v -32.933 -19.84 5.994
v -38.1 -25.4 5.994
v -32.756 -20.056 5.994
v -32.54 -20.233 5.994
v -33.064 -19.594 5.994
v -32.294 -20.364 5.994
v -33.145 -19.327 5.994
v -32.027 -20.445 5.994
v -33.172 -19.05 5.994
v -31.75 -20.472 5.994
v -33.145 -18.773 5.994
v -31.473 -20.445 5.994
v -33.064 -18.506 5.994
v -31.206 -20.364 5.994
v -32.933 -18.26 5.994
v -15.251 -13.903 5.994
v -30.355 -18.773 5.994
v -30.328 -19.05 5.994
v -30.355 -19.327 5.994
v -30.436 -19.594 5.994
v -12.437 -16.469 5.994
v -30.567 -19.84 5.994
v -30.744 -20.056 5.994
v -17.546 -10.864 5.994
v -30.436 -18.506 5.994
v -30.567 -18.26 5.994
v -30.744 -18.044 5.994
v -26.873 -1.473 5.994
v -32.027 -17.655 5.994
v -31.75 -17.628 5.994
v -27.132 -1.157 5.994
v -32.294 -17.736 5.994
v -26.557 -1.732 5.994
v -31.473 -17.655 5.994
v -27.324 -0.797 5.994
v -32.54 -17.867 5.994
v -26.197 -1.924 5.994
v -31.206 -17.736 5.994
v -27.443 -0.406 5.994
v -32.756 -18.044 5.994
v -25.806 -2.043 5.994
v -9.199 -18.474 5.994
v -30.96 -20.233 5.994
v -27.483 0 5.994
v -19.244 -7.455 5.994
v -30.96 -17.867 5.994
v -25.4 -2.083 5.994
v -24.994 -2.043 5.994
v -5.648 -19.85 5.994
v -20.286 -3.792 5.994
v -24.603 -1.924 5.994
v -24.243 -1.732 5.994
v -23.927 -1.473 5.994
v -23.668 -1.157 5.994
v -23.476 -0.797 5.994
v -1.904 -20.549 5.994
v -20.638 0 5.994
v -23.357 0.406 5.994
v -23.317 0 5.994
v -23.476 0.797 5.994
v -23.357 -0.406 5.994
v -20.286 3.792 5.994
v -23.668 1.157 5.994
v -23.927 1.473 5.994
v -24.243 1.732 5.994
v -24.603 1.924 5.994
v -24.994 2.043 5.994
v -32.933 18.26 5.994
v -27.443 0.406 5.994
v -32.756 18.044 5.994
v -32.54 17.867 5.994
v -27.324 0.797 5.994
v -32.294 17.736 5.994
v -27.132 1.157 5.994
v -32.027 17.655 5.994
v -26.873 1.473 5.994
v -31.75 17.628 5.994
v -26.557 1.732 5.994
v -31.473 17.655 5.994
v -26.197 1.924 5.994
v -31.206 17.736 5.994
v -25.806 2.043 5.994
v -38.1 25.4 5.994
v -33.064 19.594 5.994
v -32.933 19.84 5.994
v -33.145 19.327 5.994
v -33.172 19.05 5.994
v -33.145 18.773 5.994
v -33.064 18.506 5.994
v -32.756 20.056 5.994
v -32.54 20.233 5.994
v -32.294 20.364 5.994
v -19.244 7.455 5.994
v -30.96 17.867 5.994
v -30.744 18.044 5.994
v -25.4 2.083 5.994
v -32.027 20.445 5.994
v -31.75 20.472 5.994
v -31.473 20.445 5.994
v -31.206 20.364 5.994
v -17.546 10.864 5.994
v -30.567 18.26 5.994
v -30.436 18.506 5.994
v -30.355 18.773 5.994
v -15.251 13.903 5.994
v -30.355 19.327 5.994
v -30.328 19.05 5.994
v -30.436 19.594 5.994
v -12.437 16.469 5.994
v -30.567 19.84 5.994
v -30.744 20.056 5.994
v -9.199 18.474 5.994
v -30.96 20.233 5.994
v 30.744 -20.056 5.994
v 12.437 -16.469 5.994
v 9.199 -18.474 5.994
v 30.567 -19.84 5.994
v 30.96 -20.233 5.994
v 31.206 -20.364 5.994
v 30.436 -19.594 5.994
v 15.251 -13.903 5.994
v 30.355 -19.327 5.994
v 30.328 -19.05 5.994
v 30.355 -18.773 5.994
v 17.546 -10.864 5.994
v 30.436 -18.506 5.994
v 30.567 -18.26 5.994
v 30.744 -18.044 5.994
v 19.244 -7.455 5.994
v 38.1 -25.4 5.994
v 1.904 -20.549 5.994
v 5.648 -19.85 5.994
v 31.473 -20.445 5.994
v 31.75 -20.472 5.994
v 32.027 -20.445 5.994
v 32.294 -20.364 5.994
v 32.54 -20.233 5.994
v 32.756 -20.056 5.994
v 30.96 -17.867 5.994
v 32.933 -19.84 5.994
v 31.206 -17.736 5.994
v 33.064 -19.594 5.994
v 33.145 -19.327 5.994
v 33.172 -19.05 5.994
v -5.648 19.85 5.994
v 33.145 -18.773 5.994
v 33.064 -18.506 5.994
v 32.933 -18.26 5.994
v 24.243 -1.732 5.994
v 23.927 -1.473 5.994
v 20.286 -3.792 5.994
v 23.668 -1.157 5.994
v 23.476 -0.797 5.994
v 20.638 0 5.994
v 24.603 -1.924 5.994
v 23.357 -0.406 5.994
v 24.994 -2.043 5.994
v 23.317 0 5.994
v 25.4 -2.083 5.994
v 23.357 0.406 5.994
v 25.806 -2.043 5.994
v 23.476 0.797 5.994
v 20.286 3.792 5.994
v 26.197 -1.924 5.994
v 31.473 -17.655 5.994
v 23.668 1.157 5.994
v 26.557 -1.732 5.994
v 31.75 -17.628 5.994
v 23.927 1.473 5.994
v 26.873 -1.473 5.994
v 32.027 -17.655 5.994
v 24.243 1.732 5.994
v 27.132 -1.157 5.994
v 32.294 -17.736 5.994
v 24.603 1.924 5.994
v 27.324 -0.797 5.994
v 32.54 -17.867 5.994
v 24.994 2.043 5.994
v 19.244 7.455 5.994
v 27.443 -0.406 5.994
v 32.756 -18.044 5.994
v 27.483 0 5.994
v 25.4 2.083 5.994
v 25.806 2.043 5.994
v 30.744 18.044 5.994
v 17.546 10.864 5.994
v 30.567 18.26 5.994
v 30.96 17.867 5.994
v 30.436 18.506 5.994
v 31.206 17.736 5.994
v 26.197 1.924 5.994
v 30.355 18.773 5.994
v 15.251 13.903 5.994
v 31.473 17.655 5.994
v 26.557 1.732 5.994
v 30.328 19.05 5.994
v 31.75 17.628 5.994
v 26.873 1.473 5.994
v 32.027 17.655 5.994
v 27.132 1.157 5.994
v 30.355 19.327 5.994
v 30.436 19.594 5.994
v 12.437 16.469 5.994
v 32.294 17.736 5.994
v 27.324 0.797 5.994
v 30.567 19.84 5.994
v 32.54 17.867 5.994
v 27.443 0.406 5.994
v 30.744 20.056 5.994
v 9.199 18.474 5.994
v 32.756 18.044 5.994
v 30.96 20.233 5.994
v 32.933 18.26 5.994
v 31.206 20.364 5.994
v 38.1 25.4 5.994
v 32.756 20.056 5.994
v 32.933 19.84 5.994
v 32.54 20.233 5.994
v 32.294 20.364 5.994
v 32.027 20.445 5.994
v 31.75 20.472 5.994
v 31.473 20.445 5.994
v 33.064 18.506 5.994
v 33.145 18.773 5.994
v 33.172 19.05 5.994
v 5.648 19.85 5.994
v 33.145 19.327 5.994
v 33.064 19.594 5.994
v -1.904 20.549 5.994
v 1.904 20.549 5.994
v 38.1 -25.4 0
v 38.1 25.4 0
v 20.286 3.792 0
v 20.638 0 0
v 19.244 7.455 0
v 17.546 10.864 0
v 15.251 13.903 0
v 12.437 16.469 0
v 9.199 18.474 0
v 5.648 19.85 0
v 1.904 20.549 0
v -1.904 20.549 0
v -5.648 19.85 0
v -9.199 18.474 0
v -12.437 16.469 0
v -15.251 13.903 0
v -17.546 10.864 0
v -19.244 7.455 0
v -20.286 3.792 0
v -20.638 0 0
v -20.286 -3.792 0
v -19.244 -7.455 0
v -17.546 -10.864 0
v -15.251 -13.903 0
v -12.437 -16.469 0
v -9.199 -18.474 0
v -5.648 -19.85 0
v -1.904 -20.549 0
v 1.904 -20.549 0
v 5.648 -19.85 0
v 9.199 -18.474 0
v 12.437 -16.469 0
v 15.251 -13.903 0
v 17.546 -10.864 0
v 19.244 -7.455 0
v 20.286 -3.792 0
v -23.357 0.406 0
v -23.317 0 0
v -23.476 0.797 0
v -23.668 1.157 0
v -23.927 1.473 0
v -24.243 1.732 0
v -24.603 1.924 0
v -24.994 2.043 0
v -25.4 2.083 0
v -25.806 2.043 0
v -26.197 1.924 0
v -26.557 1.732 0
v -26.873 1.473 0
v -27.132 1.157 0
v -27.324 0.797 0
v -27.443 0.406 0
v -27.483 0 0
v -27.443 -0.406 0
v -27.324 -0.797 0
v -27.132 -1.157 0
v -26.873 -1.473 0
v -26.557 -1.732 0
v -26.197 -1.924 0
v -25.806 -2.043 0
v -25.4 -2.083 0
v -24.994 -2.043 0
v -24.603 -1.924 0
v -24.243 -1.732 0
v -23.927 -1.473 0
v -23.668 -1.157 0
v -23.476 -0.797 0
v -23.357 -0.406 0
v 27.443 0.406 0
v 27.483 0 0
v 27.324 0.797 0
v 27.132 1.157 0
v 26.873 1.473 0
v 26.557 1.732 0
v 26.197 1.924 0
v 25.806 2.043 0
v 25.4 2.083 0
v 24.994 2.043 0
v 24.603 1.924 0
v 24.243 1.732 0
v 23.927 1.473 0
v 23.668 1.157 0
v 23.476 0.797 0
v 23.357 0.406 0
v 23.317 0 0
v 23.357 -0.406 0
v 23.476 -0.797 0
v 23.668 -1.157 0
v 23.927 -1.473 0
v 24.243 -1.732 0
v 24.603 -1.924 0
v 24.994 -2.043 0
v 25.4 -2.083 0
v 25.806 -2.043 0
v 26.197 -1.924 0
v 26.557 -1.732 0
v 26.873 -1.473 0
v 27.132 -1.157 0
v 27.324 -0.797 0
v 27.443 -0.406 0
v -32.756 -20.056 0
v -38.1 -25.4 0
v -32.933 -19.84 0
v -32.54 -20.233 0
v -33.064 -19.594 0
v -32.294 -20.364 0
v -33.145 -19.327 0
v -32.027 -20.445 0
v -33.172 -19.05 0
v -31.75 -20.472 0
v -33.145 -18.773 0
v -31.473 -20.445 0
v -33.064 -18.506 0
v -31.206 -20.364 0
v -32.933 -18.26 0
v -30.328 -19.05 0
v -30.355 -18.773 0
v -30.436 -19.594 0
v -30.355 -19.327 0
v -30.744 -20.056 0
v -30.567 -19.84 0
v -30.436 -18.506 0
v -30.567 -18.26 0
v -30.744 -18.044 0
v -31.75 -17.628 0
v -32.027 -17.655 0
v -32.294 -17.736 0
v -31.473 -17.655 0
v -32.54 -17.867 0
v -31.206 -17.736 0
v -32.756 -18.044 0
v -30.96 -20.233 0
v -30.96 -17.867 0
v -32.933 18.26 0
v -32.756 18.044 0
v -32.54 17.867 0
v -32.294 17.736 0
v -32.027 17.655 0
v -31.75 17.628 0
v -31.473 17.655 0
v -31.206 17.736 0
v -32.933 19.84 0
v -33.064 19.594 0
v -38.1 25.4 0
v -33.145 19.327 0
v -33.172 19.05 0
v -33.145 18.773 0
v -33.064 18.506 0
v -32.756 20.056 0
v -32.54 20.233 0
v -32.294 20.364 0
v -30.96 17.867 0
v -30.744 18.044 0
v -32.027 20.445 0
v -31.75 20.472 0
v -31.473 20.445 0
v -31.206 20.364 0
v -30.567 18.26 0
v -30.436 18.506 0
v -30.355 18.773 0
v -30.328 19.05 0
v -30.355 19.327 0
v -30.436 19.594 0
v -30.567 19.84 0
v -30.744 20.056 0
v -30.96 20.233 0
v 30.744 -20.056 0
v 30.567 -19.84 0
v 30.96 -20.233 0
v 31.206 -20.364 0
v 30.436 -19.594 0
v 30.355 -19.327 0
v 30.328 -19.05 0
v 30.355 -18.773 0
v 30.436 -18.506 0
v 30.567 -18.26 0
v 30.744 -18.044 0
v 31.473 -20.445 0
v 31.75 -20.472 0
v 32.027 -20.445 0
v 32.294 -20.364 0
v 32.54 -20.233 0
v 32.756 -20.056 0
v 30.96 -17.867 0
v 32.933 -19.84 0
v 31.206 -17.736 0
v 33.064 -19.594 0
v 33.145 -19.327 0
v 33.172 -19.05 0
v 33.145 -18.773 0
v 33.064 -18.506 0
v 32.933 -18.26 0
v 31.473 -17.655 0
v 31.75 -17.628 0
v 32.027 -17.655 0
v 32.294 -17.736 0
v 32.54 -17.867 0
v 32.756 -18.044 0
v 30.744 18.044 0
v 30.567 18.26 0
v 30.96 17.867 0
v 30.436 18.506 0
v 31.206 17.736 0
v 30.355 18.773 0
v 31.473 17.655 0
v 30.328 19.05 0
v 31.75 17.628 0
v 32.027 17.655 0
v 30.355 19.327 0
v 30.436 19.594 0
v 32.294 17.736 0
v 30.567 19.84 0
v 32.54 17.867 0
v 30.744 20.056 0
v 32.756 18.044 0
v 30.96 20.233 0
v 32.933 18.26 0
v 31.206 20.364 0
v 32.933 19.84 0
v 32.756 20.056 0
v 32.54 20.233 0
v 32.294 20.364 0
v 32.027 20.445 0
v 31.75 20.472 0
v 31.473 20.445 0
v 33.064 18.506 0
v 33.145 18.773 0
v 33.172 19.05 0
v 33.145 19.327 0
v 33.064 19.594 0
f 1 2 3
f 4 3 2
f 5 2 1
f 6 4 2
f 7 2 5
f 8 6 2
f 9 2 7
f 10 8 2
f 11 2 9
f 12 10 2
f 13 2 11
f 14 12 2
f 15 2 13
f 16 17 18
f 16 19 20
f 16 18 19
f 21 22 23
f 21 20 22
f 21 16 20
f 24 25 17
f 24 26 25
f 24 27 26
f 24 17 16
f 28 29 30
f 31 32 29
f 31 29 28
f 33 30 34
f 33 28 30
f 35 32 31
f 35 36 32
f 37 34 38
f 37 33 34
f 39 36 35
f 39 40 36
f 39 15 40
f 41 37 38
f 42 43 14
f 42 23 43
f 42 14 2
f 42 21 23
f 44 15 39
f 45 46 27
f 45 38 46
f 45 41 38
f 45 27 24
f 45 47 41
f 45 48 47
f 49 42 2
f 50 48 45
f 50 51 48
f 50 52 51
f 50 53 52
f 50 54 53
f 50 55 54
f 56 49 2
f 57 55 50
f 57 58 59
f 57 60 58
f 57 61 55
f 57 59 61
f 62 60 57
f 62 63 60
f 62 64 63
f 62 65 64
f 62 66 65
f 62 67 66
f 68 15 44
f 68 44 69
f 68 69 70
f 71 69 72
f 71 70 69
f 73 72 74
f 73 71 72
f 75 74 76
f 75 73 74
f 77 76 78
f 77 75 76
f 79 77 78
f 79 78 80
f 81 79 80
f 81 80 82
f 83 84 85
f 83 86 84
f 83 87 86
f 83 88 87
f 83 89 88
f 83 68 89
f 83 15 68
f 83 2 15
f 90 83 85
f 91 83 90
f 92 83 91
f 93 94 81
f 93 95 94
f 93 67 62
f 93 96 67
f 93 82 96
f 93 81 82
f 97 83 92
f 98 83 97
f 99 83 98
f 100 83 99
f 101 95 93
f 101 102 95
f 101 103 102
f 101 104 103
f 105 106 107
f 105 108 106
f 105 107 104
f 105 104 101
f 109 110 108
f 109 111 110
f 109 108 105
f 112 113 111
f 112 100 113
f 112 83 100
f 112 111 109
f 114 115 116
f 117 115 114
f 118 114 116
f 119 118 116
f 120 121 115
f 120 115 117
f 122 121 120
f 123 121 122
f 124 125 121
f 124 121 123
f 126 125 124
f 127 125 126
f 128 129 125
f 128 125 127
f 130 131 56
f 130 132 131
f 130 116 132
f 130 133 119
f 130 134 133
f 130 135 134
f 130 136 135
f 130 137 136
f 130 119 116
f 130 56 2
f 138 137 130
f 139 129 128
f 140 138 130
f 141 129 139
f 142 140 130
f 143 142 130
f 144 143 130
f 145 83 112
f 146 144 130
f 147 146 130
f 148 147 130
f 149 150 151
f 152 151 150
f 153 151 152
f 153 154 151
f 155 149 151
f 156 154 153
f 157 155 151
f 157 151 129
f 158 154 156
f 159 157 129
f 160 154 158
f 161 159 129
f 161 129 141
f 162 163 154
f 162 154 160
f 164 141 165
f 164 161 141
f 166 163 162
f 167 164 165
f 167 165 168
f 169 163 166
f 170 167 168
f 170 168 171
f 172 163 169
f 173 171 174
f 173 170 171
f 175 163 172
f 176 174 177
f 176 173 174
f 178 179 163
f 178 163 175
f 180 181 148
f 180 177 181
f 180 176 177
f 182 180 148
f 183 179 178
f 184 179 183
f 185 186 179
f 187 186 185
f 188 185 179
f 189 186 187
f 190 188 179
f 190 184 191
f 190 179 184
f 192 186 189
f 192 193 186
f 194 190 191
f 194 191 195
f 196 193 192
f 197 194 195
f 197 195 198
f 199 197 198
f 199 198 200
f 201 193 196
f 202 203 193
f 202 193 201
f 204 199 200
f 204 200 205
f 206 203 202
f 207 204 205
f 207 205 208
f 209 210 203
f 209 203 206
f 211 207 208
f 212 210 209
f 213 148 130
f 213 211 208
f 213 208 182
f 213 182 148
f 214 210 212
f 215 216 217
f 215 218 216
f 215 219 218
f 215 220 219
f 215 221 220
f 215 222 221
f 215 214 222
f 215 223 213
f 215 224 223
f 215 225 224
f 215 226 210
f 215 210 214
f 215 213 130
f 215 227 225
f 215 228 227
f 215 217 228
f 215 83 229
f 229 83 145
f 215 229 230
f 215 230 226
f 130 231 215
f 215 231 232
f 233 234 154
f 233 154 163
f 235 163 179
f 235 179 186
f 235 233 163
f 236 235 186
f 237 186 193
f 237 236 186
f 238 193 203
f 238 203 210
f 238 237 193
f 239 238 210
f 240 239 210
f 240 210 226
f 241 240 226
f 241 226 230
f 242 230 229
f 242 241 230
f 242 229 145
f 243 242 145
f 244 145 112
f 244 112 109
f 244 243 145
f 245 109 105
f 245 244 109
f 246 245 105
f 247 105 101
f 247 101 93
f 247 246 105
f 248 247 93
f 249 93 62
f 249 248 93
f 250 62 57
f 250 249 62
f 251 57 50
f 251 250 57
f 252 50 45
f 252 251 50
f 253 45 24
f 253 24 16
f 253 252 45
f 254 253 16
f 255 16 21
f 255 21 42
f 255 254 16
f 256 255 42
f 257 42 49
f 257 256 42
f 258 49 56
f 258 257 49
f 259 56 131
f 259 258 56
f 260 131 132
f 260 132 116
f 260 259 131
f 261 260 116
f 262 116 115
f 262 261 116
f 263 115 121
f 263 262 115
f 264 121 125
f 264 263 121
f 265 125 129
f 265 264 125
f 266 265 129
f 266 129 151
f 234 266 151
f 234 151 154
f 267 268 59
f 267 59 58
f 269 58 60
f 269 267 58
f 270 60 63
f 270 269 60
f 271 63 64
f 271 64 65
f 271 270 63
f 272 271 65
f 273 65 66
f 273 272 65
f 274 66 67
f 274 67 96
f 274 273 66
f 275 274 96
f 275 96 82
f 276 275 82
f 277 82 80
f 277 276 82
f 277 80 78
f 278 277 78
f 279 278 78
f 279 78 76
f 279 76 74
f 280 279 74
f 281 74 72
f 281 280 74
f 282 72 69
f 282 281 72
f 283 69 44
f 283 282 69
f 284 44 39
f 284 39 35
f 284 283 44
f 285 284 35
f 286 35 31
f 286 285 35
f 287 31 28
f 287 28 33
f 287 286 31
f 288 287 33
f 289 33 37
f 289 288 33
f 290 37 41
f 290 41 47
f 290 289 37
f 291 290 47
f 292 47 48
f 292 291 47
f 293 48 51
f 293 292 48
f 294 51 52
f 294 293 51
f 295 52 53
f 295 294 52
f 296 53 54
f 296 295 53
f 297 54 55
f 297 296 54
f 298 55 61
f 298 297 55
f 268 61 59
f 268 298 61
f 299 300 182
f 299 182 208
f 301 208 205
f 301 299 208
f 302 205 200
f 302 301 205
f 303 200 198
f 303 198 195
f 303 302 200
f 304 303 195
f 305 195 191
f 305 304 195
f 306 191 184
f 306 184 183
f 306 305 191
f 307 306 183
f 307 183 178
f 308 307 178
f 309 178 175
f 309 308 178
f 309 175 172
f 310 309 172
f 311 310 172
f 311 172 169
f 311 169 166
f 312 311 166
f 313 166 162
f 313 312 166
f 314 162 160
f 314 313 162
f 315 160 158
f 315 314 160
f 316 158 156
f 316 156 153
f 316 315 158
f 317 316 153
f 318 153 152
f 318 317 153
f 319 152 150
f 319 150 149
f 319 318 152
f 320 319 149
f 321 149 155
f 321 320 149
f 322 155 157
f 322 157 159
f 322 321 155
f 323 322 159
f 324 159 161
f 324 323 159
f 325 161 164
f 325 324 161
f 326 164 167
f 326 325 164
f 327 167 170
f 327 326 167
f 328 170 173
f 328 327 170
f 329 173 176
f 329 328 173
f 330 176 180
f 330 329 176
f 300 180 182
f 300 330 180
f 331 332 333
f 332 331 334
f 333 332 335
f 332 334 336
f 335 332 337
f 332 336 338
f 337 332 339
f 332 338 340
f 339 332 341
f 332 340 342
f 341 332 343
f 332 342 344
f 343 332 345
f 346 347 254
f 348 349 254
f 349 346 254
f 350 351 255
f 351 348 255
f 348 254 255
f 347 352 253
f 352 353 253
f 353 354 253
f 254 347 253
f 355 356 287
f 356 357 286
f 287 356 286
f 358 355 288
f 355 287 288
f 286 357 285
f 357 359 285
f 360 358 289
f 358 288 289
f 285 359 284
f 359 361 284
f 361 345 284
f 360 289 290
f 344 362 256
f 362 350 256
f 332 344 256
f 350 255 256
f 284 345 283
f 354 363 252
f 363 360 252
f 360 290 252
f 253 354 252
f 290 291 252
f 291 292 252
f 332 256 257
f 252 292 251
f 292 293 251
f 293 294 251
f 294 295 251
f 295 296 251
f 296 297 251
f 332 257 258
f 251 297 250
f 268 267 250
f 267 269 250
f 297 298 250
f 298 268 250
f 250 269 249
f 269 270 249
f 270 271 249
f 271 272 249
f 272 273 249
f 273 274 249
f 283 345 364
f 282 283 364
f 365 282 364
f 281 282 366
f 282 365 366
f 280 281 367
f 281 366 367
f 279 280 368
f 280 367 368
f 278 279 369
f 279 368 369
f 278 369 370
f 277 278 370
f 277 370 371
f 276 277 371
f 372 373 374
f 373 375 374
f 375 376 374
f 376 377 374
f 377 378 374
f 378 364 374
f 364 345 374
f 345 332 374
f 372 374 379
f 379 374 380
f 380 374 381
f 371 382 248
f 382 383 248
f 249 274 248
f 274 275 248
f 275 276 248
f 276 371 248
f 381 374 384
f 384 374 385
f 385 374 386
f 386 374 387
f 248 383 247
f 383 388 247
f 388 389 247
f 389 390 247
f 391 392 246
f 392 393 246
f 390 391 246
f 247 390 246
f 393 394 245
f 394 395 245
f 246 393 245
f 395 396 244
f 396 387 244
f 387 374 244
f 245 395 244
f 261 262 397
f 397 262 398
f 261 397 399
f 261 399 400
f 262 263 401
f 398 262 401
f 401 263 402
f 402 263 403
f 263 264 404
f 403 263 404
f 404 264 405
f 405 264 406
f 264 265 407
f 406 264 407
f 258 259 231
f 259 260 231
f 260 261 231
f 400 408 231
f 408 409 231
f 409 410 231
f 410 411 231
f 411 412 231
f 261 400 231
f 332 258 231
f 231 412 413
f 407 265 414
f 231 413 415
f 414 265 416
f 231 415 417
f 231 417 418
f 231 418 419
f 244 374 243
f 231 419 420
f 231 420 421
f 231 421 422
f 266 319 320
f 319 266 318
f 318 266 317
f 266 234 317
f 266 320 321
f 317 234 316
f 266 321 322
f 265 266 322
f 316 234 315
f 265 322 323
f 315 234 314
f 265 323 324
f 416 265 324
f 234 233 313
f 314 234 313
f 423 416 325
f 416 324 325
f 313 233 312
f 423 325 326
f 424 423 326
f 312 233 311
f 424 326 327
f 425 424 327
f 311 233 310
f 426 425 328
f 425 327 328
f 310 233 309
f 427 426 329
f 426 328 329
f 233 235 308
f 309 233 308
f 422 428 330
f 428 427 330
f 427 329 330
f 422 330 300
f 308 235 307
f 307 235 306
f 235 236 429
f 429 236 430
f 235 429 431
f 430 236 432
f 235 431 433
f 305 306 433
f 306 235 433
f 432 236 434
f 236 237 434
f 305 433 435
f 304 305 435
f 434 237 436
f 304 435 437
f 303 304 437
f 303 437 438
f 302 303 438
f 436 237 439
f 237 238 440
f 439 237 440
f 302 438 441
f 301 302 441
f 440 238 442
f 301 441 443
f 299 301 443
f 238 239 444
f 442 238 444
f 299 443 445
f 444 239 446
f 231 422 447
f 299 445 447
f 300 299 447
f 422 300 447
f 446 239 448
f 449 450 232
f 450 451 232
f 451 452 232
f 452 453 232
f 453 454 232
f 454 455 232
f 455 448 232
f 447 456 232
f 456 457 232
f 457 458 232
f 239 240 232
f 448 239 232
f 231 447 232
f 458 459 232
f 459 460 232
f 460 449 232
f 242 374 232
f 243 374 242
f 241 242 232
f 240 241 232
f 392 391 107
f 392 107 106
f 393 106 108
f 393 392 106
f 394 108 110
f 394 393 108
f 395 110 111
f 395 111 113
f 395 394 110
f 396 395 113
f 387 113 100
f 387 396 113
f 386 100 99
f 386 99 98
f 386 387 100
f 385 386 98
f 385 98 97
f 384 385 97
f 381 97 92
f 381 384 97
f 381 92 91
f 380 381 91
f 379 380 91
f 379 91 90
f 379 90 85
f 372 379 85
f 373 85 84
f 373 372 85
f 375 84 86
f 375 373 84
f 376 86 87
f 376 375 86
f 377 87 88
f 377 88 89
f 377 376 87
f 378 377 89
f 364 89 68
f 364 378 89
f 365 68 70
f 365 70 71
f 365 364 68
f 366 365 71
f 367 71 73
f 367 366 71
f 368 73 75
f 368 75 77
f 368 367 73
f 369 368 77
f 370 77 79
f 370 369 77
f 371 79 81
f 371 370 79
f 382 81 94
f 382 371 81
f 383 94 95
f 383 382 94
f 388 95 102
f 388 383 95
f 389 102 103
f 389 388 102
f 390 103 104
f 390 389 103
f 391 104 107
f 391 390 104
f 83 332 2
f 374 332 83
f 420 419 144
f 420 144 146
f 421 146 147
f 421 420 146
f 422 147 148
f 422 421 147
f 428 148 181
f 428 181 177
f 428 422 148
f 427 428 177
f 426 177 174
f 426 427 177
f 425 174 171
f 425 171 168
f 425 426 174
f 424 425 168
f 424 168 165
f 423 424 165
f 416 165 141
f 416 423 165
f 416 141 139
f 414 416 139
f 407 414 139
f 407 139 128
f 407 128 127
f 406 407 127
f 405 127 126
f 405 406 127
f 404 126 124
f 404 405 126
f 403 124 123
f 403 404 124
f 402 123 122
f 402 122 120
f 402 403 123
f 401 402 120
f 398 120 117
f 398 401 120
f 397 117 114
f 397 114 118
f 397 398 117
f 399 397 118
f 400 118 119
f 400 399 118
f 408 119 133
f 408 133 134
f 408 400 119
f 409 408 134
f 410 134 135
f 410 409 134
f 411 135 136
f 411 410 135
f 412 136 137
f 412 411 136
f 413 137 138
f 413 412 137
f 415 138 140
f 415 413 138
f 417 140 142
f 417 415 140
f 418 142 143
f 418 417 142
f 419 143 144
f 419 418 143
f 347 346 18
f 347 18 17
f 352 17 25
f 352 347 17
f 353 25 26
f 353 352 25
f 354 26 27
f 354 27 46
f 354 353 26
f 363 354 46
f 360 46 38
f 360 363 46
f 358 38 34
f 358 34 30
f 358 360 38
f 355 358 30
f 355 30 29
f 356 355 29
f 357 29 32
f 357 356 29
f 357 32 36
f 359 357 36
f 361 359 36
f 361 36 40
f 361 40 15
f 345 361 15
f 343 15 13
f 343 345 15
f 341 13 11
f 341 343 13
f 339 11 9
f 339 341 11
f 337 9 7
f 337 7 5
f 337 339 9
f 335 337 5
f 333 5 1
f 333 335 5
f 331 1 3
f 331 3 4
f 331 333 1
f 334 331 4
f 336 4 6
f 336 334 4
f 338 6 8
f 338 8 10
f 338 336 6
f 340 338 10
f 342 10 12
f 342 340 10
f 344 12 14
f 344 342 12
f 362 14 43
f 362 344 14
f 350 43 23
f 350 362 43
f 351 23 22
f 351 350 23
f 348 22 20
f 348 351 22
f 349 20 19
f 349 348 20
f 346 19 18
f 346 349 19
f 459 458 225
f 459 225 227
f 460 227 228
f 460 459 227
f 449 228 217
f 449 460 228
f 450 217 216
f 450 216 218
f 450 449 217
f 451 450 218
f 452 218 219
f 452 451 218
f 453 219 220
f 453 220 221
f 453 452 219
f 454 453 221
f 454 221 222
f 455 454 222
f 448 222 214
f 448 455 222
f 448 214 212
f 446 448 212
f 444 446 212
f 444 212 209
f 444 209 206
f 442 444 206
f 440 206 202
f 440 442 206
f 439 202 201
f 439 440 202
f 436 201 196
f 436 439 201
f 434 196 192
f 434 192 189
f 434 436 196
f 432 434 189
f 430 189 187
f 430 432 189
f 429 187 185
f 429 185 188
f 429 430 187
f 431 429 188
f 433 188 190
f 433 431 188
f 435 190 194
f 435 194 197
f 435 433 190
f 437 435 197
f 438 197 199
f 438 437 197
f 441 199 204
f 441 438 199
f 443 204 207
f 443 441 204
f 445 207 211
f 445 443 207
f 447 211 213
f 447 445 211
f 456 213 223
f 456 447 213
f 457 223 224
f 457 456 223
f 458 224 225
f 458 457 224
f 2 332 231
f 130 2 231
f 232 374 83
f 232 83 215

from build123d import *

# Parameters (mm, degrees)
SKETCH1_W           = 76.2
SKETCH1_H           = 50.8
SKETCH1_R           = 20.6375
SKETCH1_R_2         = 2.0828
SKETCH1_R_3         = 1.4224
BOSS_EXTRUDE1_DEPTH = 5.9944


with BuildPart() as part:
    # Sketch1 → Boss-Extrude1 (new body)
    with BuildSketch(Plane.XY):
        Rectangle(SKETCH1_W, SKETCH1_H)
        Circle(SKETCH1_R, mode=Mode.SUBTRACT)
        with Locations((-25.4, 0)):
            Circle(SKETCH1_R_2, mode=Mode.SUBTRACT)
        with Locations((25.4, 0)):
            Circle(SKETCH1_R_2, mode=Mode.SUBTRACT)
        with Locations((-31.75, 19.05)):
            Circle(SKETCH1_R_3, mode=Mode.SUBTRACT)
        with Locations((-31.75, -19.05)):
            Circle(SKETCH1_R_3, mode=Mode.SUBTRACT)
        with Locations((31.75, -19.05)):
            Circle(SKETCH1_R_3, mode=Mode.SUBTRACT)
        with Locations((31.75, 19.05)):
            Circle(SKETCH1_R_3, mode=Mode.SUBTRACT)
    extrude(amount=BOSS_EXTRUDE1_DEPTH)


solid = part.part
